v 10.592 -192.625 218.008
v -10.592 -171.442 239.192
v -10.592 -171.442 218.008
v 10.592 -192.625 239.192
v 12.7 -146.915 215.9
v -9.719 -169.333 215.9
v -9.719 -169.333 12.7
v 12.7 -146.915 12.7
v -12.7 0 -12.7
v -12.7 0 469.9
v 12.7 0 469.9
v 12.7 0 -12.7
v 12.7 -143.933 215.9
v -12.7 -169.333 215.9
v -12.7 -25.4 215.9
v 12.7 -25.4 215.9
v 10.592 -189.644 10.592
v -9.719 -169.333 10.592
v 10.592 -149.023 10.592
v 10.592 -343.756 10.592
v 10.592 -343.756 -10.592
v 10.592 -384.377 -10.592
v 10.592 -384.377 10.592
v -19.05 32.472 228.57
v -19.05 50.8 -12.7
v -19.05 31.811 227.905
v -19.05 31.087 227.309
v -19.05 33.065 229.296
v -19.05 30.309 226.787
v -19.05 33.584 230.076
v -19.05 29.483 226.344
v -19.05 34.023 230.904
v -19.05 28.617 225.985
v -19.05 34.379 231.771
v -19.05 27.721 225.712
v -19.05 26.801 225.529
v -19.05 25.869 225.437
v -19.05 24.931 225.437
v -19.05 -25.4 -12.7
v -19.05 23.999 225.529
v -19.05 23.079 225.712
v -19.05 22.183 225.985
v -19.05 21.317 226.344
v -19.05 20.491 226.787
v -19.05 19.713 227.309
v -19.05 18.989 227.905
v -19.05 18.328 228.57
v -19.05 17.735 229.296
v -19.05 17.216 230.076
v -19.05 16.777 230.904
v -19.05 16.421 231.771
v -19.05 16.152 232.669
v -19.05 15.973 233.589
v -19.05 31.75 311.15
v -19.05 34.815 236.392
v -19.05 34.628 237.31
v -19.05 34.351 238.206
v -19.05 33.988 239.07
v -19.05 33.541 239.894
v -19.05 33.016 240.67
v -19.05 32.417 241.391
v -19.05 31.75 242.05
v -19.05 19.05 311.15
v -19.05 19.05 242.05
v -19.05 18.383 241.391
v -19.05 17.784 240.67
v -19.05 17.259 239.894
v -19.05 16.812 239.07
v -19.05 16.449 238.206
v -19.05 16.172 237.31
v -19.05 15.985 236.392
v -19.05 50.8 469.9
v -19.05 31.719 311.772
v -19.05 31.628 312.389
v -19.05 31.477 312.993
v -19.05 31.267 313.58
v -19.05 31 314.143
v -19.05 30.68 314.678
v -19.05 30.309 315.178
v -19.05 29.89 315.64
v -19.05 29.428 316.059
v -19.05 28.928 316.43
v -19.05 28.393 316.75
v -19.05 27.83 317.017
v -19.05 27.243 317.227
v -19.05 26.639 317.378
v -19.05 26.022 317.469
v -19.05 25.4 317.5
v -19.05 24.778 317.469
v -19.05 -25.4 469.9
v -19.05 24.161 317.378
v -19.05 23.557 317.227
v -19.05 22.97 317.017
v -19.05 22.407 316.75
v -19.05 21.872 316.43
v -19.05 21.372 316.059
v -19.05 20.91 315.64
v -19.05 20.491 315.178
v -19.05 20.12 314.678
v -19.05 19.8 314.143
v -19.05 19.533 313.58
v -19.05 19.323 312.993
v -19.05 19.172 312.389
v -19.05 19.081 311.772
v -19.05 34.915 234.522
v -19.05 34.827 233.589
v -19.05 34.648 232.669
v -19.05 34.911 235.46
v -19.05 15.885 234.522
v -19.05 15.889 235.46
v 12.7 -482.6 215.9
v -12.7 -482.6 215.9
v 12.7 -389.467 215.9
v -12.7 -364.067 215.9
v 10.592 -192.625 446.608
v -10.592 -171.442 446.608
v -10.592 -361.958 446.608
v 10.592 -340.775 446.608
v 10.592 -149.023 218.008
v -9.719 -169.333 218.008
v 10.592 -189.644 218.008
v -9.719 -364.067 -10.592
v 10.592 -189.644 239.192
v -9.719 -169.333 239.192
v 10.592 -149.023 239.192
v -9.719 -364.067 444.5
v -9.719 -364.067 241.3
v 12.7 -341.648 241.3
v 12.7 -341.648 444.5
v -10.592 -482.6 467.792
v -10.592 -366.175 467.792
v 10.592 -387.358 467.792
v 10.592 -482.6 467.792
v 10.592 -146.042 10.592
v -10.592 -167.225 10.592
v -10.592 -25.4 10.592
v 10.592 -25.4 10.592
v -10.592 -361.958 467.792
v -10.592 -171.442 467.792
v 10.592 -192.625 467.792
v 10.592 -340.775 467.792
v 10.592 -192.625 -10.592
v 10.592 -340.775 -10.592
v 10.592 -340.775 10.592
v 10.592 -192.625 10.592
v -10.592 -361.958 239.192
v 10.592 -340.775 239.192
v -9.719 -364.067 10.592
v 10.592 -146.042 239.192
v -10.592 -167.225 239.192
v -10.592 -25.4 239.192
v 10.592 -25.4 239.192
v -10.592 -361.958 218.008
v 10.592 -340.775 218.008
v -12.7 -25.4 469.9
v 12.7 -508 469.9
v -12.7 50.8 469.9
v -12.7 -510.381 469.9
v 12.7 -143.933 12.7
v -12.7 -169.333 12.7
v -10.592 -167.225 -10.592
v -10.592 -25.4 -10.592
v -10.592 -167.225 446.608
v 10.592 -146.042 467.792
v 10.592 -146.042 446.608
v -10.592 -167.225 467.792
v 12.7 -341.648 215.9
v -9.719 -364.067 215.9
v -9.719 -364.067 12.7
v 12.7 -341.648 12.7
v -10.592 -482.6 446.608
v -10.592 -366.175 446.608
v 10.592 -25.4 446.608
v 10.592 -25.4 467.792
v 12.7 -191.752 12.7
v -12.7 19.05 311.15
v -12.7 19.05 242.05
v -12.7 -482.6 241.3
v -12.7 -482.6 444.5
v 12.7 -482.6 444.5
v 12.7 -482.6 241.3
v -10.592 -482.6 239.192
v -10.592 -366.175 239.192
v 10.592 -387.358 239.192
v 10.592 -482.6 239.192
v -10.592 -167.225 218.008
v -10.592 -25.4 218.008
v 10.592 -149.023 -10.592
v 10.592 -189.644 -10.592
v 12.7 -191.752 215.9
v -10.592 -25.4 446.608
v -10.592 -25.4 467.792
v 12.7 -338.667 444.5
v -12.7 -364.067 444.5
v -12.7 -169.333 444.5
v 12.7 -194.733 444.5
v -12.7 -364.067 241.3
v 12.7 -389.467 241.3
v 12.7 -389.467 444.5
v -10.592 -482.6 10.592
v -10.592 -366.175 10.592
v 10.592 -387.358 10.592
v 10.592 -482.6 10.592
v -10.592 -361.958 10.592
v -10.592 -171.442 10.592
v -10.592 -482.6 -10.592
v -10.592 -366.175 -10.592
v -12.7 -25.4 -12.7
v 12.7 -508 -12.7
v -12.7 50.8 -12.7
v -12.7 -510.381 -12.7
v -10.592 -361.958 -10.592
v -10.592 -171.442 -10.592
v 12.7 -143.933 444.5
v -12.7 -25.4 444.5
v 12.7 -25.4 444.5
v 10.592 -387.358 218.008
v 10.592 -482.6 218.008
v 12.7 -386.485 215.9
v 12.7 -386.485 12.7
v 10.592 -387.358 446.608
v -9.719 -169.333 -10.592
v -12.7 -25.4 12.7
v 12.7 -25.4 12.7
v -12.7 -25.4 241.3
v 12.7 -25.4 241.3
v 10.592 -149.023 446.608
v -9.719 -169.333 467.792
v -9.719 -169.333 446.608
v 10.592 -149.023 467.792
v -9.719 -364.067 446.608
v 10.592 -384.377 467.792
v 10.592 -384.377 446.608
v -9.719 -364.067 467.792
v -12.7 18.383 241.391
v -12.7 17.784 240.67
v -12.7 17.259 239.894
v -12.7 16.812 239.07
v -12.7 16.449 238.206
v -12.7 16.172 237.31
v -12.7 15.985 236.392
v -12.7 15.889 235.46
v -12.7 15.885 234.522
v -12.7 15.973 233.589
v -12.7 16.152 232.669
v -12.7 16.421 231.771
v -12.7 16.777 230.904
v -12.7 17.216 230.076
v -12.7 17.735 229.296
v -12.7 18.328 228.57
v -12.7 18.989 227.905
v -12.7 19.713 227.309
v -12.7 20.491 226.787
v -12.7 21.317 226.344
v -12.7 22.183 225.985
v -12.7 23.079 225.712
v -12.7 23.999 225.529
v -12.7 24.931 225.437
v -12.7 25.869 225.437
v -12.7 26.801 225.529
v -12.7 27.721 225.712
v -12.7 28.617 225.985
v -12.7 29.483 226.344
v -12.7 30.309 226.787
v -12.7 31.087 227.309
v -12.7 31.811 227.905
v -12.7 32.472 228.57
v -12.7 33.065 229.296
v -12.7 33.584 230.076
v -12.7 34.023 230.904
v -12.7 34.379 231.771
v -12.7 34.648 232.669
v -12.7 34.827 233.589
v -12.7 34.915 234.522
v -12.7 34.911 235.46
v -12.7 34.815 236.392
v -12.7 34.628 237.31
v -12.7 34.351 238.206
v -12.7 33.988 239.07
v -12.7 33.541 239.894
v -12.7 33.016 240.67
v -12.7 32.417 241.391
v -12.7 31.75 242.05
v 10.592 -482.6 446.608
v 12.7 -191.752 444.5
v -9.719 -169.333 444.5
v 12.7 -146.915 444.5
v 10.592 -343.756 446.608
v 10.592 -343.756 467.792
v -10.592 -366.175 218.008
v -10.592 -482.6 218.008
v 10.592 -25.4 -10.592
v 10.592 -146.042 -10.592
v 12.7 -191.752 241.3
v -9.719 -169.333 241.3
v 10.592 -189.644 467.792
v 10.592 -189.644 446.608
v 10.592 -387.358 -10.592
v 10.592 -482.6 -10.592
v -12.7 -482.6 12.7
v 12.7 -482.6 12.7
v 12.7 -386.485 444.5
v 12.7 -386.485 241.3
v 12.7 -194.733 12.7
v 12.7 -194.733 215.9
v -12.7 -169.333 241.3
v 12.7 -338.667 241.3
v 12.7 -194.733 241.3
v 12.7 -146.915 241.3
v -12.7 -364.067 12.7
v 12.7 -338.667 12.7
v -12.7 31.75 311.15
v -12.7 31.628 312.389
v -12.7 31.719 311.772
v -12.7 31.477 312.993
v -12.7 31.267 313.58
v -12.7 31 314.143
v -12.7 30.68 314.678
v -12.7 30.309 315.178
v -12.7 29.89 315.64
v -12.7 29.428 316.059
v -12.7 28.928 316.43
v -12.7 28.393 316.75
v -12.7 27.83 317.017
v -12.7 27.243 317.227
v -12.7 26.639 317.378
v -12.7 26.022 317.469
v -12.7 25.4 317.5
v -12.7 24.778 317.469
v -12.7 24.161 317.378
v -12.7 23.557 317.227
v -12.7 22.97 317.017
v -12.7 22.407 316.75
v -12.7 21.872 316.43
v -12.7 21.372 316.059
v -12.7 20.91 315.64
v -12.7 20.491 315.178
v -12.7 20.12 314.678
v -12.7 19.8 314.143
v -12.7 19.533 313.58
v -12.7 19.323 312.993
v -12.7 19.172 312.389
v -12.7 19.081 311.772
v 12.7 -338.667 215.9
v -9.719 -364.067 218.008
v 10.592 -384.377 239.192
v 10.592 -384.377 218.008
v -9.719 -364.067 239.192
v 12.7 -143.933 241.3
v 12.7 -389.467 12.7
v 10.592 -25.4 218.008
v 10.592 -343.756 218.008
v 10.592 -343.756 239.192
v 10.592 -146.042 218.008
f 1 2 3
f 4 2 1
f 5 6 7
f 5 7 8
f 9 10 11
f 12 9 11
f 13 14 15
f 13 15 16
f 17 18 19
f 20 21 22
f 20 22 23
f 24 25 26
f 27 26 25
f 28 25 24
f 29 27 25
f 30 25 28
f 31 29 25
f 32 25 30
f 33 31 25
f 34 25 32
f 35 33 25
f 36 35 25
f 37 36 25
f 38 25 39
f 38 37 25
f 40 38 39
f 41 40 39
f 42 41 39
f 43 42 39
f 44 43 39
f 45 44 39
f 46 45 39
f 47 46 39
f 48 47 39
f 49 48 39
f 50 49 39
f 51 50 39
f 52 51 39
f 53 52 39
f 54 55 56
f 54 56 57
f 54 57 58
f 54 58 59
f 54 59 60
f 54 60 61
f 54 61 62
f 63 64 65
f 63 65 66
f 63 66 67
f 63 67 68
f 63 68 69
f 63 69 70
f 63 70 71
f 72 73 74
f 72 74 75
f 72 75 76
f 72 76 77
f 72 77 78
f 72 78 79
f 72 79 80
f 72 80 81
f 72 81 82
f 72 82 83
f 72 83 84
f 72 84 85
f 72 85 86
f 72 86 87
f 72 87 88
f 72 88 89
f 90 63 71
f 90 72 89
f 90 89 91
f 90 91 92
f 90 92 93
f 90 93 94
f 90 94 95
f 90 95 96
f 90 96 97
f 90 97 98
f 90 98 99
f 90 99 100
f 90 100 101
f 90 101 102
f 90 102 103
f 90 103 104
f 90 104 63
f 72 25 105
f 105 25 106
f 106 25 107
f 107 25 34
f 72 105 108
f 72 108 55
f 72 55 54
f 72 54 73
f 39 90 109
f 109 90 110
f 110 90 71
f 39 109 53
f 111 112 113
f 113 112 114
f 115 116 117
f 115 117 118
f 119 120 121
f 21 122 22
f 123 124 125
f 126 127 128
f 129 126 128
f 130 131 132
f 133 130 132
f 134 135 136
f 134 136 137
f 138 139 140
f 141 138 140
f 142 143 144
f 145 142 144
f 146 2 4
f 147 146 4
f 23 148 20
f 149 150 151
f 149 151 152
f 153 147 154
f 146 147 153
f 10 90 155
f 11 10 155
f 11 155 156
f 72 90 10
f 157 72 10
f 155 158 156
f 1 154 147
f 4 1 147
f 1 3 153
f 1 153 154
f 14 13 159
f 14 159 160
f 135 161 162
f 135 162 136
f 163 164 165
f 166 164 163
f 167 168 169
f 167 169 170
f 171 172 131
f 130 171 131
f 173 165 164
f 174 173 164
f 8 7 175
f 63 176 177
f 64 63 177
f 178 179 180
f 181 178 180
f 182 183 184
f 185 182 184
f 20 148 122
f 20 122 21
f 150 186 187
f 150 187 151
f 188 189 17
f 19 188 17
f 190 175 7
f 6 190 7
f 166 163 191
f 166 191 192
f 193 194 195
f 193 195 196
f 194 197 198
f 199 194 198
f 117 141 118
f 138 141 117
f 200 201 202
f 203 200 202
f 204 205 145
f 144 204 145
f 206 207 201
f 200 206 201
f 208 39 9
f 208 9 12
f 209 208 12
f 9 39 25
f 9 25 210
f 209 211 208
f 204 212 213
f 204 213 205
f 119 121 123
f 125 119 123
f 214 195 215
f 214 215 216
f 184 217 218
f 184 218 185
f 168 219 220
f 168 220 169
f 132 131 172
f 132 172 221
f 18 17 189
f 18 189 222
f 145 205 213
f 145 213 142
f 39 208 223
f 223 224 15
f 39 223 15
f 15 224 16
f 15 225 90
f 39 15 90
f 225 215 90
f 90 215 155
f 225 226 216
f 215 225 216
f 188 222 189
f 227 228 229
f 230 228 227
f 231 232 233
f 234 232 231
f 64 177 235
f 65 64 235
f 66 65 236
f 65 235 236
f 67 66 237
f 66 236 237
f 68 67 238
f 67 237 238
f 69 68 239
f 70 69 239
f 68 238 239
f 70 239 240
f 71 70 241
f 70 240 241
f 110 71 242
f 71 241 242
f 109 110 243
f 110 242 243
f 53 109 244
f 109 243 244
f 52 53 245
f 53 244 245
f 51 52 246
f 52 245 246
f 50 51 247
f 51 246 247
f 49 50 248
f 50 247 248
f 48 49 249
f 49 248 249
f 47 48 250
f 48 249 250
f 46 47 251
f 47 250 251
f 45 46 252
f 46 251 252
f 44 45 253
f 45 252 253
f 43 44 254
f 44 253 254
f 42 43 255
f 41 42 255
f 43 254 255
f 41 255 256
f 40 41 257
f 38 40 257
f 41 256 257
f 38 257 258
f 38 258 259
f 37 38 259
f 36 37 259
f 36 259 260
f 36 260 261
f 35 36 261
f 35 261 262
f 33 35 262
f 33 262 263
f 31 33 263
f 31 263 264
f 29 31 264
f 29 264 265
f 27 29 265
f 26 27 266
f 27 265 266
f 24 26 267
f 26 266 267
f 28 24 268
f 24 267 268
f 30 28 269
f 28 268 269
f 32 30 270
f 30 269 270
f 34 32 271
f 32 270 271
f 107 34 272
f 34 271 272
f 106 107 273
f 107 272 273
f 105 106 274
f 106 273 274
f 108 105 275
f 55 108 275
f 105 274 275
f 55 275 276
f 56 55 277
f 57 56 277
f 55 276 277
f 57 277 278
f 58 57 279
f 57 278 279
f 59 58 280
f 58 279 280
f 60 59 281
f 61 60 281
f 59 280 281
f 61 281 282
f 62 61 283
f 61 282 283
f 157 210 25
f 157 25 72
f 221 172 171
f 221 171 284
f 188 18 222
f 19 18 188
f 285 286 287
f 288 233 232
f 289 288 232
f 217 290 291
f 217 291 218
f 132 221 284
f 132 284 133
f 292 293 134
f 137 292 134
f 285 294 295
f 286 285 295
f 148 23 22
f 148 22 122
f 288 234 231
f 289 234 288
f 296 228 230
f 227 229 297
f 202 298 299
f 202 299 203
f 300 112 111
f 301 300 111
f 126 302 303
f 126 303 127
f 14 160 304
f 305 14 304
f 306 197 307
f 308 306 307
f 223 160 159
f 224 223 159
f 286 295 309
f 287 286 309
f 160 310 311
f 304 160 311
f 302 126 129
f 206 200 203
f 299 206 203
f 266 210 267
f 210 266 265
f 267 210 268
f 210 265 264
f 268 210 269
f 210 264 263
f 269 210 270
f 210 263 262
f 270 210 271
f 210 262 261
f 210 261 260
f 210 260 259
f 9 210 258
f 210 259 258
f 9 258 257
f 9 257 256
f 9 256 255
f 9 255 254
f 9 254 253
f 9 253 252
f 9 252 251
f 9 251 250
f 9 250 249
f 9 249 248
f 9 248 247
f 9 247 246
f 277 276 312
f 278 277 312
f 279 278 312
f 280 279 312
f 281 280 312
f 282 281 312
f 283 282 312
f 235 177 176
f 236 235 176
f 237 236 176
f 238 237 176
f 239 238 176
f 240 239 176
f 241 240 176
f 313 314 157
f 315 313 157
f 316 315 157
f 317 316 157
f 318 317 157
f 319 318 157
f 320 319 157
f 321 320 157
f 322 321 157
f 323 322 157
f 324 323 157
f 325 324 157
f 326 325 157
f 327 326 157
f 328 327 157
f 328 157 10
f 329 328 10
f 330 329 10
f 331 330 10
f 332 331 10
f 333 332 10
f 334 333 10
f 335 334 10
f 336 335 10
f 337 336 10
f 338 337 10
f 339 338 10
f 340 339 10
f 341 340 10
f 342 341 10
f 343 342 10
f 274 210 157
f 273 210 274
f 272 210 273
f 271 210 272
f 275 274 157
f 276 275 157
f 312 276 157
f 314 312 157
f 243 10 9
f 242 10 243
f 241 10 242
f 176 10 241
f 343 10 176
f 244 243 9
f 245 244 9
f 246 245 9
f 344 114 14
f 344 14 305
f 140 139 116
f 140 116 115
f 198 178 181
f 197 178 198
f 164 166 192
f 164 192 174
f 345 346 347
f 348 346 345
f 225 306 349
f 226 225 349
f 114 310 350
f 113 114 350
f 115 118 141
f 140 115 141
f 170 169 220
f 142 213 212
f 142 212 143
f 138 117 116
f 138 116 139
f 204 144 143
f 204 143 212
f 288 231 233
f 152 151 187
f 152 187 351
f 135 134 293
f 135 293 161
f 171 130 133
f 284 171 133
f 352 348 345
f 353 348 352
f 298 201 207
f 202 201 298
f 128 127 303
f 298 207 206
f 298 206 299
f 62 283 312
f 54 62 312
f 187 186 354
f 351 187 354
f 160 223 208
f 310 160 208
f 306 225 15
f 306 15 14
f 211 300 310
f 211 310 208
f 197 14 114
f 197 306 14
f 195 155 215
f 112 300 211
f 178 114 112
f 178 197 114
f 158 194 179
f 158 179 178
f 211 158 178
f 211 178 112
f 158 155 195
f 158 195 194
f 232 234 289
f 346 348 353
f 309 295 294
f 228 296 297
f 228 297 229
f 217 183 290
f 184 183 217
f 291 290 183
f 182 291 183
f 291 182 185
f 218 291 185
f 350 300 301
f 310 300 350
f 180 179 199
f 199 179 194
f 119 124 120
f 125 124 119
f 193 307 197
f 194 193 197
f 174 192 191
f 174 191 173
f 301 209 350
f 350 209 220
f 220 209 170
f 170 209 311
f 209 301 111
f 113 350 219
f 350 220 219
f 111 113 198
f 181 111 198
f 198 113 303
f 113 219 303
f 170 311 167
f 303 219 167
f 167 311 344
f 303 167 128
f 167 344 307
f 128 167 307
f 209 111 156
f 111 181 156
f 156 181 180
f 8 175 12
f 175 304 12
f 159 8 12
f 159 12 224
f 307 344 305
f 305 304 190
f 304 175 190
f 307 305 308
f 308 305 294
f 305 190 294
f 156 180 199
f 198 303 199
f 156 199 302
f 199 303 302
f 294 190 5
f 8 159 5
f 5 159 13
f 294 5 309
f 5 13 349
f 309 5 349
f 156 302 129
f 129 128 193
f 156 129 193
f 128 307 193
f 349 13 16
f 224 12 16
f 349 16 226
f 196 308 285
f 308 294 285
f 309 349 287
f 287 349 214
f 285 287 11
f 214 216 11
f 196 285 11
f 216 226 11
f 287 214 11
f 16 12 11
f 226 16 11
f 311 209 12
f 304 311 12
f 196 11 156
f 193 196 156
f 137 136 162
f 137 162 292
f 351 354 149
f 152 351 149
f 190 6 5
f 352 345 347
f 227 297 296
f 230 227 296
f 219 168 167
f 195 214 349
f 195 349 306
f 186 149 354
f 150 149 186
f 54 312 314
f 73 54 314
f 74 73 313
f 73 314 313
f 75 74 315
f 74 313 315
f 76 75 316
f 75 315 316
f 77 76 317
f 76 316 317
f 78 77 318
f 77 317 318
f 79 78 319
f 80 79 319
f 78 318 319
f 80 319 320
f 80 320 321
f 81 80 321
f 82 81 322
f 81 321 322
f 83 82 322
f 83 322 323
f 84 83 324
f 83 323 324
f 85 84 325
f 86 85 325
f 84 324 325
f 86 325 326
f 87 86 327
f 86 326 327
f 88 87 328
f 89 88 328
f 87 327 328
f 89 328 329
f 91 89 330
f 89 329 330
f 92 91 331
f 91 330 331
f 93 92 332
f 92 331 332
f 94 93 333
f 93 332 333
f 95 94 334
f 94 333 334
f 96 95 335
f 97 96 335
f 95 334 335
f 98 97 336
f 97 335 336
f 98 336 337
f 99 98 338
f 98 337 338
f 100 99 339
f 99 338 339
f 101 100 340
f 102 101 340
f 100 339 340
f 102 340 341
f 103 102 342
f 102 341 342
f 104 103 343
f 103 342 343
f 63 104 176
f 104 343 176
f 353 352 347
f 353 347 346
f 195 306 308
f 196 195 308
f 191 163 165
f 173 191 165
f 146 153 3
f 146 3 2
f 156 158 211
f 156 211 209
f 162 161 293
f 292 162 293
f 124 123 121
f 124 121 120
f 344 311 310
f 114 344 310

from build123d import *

# Parameters (mm, degrees)
F0_W     = 25.4
F0_H     = 25.4
F0_W_2   = 21.1836
F0_H_2   = 21.1836
F1_DEPTH = 508
F2_W     = 25.4
F2_H     = 25.4
F3_DEPTH = 482.6
F4_W     = 76.2
F4_H     = 482.6
F5_DEPTH = 6.35
F7_DEPTH = 482.6
F9_DEPTH = 482.6


with BuildPart() as f1:
    # F0 (on Front) → F1 (new body)
    with BuildSketch(Plane.XZ):
        with Locations((0, 457.2)):
            Rectangle(F0_W, F0_H)
        with Locations((0, 457.2)):
            Rectangle(F0_W_2, F0_H_2, mode=Mode.SUBTRACT)
        with Locations((0, 228.6)):
            Rectangle(F0_W, F0_H)
        with Locations((0, 228.6)):
            Rectangle(F0_W_2, F0_H_2, mode=Mode.SUBTRACT)
        Rectangle(F0_W, F0_H)
        Rectangle(F0_W_2, F0_H_2, mode=Mode.SUBTRACT)
    extrude(amount=F1_DEPTH)

    # F2 (on face) → F3 (join)
    with BuildSketch(Plane.XY.offset(469.9)):
        with Locations((0, -12.7)):
            Rectangle(F2_W, F2_H)
        with Locations((0, -495.3)):
            Rectangle(F2_W, F2_H)
    extrude(amount=-F3_DEPTH)

    # F4 (on face) → F5 (join)
    with BuildSketch(Plane(origin=(-12.7, 0, 0), x_dir=(0, -1, 0), z_dir=(-1, 0, 0))):
        with Locations((-12.7, 228.6)):
            Rectangle(F4_W, F4_H)
        with BuildLine():
            ThreePointArc((-19.05, 242.049516), (-25.4, 225.425), (-31.75, 242.049516))
            Line((-31.75, 242.049516), (-31.75, 311.15))
            ThreePointArc((-31.75, 311.15), (-25.4, 317.5), (-19.05, 311.15))
            Line((-19.05, 311.15), (-19.05, 242.049516))
        make_face(mode=Mode.SUBTRACT)
    extrude(amount=F5_DEPTH)

    # F6 (on face) → F7 (join)
    with BuildSketch(Plane.XY.offset(469.9)):
        Polygon((-12.7, -169.333333), (12.7, -194.733333), (12.7, -191.751888), (-9.718555, -169.333333), (12.7, -146.914778), (12.7, -143.933333), align=None)
        Polygon((-12.7, -364.066667), (12.7, -389.466667), (12.7, -386.485222), (-9.718555, -364.066667), (12.7, -341.648112), (12.7, -338.666667), align=None)
    extrude(amount=-F7_DEPTH)

    # F8 (on face) → F9 (join)
    with BuildSketch(Plane.XY.offset(469.9)):
        Polygon((-12.7, -510.38125), (12.7, -508), (-12.7, -508), align=None)
    extrude(amount=-F9_DEPTH)


solid = f1.part
